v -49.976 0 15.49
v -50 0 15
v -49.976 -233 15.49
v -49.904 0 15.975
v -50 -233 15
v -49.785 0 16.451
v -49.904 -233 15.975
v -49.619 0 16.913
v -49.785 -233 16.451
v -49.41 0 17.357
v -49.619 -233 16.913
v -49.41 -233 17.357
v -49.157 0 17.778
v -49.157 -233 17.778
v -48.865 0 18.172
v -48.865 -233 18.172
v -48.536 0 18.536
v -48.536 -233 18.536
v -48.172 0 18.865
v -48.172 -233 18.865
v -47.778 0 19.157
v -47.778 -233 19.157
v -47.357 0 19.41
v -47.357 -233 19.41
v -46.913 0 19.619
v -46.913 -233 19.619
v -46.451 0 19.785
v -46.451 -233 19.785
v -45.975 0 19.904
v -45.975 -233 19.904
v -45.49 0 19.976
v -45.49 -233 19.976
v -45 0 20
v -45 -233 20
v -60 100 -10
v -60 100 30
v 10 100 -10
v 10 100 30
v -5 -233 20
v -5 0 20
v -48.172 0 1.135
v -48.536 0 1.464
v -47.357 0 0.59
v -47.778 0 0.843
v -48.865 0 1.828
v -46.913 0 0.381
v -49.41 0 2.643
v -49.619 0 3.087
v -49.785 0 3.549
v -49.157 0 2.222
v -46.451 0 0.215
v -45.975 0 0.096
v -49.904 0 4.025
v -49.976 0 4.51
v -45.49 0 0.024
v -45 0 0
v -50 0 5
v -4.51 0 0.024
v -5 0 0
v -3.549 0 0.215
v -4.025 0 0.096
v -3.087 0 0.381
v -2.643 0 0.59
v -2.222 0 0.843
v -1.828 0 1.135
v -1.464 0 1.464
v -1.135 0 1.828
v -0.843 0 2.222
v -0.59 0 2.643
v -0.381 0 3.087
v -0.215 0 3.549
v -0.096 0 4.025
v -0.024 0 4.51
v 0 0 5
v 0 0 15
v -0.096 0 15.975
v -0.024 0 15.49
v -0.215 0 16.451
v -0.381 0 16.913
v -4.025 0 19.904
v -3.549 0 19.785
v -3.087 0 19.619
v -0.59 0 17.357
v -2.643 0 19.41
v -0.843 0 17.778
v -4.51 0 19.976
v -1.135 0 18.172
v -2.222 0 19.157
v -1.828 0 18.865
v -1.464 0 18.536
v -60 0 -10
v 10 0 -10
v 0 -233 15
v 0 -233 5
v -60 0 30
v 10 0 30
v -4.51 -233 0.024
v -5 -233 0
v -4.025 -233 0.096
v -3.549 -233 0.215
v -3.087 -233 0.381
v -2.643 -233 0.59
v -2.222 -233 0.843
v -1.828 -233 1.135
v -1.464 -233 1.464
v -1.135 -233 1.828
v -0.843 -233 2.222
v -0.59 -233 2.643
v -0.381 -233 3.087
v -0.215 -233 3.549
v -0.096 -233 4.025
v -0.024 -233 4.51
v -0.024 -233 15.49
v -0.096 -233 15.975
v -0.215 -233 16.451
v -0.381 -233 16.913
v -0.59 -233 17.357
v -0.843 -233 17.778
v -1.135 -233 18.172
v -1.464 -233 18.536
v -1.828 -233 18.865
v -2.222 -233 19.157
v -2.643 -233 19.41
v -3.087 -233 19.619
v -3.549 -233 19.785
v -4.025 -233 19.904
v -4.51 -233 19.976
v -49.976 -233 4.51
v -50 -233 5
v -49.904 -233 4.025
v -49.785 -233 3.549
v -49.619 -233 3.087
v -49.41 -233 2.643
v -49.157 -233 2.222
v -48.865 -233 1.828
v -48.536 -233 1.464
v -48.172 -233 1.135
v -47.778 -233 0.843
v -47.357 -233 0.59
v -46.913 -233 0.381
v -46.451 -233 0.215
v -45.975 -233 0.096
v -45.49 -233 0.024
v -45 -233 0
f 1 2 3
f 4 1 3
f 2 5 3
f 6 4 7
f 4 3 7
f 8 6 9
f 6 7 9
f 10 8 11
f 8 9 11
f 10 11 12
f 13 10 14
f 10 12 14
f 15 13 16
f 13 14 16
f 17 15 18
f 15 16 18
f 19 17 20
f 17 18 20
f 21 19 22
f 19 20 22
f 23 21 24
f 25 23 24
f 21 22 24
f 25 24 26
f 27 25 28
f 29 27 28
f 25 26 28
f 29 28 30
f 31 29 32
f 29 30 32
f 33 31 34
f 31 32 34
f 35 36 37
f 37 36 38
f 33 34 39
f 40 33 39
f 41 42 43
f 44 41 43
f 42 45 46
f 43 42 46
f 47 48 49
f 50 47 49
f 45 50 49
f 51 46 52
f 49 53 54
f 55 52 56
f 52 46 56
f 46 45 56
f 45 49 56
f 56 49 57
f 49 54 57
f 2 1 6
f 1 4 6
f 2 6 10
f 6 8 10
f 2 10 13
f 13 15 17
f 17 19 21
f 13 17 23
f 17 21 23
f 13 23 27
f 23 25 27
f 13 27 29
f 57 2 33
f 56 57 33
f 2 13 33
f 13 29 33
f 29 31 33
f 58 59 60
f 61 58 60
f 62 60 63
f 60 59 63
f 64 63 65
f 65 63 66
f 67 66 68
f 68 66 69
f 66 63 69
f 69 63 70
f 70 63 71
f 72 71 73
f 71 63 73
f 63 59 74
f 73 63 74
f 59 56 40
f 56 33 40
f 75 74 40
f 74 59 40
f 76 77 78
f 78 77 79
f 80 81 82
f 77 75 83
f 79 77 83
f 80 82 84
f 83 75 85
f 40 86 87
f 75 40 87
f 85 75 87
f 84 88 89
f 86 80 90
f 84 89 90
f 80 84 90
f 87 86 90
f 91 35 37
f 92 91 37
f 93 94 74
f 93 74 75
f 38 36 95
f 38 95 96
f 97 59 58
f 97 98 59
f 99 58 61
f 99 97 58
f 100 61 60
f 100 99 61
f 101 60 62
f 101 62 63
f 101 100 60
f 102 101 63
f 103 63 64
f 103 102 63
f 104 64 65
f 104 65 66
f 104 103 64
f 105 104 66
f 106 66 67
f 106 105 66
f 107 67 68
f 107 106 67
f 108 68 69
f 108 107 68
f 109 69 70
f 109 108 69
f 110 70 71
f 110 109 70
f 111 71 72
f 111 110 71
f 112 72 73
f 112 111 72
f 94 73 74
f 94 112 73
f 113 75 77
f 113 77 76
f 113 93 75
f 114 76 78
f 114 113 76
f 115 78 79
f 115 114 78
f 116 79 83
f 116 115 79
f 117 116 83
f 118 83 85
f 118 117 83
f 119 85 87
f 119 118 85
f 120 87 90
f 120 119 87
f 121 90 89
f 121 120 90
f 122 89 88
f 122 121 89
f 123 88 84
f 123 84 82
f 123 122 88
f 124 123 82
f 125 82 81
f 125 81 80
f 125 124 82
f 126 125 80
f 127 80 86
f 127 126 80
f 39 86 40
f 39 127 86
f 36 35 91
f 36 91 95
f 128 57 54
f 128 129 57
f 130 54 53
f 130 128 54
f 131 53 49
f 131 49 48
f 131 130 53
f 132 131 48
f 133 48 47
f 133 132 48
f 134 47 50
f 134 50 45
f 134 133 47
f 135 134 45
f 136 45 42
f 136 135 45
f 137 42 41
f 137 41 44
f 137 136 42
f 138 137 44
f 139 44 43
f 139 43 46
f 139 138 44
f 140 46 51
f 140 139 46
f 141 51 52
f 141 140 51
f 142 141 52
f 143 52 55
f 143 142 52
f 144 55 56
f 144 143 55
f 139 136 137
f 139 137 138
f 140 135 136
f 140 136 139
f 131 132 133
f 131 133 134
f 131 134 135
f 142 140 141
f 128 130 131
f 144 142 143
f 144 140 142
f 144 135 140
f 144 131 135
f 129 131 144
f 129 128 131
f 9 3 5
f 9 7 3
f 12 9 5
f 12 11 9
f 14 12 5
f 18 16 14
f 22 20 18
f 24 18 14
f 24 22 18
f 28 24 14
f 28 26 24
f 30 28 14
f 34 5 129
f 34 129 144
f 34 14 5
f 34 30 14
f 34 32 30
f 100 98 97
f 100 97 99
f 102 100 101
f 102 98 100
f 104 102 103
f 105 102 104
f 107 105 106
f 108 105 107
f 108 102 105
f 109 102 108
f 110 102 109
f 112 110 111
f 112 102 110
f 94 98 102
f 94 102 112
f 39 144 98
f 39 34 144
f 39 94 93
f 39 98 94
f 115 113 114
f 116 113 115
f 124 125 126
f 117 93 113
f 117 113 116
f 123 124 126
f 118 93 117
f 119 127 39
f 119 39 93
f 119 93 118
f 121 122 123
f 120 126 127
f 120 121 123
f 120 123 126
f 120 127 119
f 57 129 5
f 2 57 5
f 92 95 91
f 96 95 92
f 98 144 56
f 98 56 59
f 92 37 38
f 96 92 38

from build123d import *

# Parameters (mm, degrees)
F1_W     = 50
F1_H     = 20
F2_DEPTH = 233
F3_R     = 5
F4_W     = 70
F4_H     = 40
F5_DEPTH = 100


with BuildPart() as f2:
    # F1 (on Front) → F2 (new body)
    with BuildSketch(Plane.XZ):
        with Locations((-25, 10)):
            Rectangle(F1_W, F1_H)
    extrude(amount=F2_DEPTH)

    # F3
    f3_edges = [f2.edges().sort_by_distance(p)[0] for p in [
        (-50, -116.5, 20),
        (0, -116.5, 20),
        (-50, -116.5, 0),
        (0, -116.5, 0),
    ]]
    fillet(f3_edges, radius=F3_R)


with BuildPart() as f5:
    # F4 (on offset) → F5 (new body, through all)
    with BuildSketch(Plane.XZ.offset(-100)):
        with Locations((-25, 10)):
            Rectangle(F4_W, F4_H)
    extrude(amount=F5_DEPTH)


solid = Compound([f2.part, f5.part])
